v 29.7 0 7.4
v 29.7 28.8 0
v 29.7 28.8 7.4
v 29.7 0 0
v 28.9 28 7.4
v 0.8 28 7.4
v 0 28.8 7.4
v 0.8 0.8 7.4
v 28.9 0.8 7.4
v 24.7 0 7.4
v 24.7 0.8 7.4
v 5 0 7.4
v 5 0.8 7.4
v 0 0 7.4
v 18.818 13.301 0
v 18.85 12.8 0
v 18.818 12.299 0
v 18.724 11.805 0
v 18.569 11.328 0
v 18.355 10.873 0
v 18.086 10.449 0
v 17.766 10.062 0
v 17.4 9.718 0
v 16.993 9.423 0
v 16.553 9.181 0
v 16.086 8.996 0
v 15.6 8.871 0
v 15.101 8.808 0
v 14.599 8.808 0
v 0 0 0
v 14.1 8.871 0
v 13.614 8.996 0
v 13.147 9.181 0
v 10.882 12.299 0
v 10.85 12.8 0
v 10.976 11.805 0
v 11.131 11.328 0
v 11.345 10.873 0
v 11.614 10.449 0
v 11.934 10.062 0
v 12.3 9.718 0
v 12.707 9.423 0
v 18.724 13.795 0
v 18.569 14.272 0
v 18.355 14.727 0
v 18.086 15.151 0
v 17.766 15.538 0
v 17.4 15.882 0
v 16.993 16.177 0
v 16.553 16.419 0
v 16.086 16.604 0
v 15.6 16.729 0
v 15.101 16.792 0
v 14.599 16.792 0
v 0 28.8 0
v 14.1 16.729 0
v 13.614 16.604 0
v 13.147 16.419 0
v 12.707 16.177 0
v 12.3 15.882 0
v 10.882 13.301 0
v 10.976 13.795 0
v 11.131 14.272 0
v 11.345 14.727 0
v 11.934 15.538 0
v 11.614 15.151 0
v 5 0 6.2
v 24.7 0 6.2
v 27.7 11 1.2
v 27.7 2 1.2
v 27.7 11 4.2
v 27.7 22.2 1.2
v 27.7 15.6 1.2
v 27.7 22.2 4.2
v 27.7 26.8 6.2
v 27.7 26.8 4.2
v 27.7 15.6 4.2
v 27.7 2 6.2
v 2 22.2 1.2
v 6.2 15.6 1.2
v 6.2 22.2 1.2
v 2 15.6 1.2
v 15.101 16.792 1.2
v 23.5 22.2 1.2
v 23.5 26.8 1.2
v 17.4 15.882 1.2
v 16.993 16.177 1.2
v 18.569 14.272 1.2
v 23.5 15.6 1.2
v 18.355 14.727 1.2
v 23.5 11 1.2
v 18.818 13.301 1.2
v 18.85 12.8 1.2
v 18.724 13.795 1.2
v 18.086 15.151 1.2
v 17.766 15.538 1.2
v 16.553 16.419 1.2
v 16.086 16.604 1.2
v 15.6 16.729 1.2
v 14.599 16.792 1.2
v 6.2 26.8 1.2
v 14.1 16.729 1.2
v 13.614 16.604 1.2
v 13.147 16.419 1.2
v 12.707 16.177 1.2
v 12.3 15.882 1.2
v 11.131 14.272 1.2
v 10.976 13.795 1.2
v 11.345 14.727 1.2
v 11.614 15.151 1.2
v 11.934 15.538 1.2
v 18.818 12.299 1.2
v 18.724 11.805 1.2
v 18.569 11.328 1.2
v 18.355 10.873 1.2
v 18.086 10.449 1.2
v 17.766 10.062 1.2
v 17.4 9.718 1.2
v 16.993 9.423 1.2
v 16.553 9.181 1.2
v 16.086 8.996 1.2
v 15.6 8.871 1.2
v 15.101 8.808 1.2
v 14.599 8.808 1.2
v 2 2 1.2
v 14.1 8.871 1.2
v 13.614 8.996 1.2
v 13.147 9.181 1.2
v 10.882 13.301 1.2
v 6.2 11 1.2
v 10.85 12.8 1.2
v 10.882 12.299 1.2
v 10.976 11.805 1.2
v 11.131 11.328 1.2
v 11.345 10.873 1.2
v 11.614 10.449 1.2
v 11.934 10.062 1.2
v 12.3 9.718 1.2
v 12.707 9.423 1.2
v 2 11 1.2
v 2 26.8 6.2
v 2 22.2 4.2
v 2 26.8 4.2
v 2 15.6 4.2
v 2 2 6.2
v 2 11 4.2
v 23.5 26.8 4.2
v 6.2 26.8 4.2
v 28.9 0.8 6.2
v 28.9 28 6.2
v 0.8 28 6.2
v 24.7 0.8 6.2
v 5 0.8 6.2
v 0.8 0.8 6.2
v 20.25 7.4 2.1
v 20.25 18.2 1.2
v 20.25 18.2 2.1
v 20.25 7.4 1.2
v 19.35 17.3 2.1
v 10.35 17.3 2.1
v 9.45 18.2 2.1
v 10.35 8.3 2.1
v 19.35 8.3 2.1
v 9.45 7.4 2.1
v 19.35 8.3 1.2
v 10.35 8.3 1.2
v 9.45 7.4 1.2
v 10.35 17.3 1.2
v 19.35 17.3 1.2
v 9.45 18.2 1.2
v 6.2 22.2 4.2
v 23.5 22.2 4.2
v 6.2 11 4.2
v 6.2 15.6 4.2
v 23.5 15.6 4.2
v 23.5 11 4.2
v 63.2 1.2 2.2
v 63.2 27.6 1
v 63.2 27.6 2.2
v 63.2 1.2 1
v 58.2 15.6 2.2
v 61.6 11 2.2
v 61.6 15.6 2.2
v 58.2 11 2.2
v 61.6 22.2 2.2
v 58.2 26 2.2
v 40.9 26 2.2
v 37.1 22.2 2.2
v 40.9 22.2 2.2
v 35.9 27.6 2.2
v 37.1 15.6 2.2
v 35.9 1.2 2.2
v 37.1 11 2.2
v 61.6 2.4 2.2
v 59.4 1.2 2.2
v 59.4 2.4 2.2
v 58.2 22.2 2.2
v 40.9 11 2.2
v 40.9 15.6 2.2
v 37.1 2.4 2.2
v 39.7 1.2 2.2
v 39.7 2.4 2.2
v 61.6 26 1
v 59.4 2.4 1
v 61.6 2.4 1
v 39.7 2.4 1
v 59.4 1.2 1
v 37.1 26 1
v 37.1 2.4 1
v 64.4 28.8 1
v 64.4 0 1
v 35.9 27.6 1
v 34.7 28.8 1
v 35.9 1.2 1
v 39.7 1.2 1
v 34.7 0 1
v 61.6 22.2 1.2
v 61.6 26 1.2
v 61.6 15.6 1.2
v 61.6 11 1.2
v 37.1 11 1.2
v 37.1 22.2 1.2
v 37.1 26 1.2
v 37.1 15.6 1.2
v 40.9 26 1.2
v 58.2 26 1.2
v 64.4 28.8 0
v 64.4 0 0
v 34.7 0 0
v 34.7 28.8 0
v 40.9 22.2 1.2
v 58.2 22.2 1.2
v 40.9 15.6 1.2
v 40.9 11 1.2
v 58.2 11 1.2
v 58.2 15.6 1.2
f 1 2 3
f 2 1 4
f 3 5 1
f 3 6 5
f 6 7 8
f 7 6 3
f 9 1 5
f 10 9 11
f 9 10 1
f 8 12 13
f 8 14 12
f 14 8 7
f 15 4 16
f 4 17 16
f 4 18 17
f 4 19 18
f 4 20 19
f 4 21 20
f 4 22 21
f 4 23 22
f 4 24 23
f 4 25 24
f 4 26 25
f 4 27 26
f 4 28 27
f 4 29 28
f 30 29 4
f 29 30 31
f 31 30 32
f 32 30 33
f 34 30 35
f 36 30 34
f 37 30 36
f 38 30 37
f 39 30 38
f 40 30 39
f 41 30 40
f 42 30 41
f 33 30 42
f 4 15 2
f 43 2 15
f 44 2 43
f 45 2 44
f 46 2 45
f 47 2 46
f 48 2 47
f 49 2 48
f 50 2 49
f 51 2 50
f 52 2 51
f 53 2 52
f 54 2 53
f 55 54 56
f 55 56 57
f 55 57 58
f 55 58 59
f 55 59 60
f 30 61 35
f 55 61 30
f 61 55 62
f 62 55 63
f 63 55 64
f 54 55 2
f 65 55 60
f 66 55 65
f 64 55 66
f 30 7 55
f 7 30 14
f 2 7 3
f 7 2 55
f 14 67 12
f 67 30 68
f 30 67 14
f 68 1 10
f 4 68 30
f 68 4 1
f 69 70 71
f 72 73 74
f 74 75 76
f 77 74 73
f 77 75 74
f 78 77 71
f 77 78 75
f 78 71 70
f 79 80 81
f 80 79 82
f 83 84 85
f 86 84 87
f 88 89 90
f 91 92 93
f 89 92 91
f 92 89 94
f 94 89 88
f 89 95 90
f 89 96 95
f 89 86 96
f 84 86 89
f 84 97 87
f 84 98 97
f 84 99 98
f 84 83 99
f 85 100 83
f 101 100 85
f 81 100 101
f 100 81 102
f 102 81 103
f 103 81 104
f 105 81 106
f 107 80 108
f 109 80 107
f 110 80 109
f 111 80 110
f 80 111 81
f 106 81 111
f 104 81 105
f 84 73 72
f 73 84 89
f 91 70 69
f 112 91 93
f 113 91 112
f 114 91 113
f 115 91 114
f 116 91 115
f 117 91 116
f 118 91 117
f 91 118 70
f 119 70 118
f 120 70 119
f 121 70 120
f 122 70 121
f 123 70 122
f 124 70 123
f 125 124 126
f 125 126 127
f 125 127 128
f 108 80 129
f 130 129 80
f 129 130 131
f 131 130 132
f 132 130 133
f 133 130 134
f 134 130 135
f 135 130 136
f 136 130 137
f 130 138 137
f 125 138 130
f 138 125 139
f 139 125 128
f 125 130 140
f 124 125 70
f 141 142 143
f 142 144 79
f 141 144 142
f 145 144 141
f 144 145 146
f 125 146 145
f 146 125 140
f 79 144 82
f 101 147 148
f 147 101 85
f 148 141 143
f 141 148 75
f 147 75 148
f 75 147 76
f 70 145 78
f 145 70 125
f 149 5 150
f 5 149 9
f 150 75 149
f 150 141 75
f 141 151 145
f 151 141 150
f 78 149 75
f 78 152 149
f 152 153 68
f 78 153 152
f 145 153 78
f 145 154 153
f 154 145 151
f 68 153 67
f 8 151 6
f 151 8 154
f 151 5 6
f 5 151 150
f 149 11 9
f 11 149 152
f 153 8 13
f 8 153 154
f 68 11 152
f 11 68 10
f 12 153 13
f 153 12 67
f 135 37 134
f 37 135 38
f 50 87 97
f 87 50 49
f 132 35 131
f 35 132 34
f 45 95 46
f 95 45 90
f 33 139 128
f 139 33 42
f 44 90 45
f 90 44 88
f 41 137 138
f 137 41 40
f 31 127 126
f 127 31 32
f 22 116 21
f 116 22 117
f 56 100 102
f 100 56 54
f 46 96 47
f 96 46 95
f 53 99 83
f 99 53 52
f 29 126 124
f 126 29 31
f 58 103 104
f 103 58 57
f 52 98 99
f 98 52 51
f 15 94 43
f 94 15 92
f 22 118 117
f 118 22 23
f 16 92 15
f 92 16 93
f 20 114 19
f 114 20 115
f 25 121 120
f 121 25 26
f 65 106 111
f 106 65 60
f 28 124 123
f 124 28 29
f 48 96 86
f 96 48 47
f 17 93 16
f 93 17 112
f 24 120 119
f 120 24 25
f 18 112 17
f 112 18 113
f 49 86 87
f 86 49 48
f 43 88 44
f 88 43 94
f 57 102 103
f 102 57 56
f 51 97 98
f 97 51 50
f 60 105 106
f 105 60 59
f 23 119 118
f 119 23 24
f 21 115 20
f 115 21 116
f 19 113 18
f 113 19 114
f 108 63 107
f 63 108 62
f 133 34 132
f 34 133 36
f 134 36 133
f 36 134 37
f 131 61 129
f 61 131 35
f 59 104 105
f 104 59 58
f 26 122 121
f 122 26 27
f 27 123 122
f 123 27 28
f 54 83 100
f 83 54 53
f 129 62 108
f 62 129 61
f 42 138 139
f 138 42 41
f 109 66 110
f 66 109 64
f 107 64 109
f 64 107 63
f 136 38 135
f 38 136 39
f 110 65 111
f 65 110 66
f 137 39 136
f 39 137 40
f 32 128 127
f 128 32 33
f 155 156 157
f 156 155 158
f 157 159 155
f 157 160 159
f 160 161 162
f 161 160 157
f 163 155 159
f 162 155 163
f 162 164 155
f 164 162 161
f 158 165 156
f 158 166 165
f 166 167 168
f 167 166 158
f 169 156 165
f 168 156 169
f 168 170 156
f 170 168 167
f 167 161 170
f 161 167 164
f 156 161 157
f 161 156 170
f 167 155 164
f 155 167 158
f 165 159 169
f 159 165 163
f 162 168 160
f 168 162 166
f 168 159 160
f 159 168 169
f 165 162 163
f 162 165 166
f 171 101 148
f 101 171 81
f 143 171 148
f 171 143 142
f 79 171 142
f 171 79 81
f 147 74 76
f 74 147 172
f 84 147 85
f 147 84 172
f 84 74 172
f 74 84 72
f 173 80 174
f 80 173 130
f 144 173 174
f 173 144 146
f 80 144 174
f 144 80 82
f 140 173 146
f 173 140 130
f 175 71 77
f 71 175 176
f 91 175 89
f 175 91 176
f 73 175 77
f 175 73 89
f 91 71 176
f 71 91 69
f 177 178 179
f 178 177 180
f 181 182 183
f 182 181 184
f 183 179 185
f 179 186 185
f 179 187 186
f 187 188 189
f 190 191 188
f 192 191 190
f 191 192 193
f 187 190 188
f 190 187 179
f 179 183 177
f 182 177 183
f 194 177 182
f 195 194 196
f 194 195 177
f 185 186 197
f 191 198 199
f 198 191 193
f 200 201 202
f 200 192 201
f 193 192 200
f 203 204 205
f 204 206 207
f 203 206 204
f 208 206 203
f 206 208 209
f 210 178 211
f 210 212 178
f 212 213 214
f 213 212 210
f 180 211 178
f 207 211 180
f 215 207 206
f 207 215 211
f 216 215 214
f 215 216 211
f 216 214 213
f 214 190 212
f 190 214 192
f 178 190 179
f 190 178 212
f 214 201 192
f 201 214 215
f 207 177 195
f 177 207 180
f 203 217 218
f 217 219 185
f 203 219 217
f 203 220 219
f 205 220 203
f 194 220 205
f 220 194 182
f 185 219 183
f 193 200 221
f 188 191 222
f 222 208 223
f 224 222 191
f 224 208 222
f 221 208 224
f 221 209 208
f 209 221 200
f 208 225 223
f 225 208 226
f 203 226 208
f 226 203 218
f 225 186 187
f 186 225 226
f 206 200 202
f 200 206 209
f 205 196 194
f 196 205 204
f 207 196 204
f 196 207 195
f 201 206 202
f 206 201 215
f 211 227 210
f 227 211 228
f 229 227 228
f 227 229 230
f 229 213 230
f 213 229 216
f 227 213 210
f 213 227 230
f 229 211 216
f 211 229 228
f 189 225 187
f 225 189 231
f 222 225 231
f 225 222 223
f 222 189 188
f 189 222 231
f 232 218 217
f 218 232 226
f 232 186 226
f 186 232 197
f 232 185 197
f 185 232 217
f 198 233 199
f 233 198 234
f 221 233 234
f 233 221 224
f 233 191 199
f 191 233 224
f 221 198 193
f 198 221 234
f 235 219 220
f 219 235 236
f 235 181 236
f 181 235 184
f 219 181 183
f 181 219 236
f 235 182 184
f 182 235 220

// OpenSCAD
///////////////
// Variables //
///////////////

clearance = 0.4;

// wall width
wall_width = 2;

// Camera module x
module_x = 24.9;

// Camera module y
module_y = 24;

// Camera module y
module_z = 7.8;

// Inner depth
shell_width = 1.2;

// Lip thickness
lip_width = 1.2;

// Lip height
lip_height = 1.2;

// Ribbon cable slot offset
ribbon_offset_x = 5;

// Ribbon cable slot height
ribbon_z = 1.2;

// Hole diameter for the lens
lens_diameter = 8;

// Move lens hole a little bit off the middle
lens_y_offset = 1.6;

// Borders for the lense module
lens_cube = 9;

// Border thickness for the lens module
lens_cube_wall = 0.9;

// Module spacer x
module_stand_x = 4.2;

// Module spacer y
module_stand_y = 4.6;

// Module spacer z
module_stand_z = 3;

// Move two spacers to the middle
module_stand_offset = 9;

// Lid thickness
lid_height = 1;


///////////////////////
// Calculated values //
///////////////////////

case_top_x = module_x+2*wall_width+2*clearance;
case_top_y = module_y+2*wall_width+2*clearance;
case_top_z = module_z - clearance;

////////////////
// Draw parts //
////////////////

case_top();
translate([case_top_x+5, 0, 0]) {
    lid();
}

/////////////
// Modules //
/////////////

module case_top() {
    
    difference() {
        
        // Outer cube
        cube ([case_top_x, case_top_y, case_top_z]);
        
        // Inner cube
        inner_cube_x = case_top_x - 2*wall_width;
        inner_cube_y = case_top_y - 2*wall_width;
        inner_cube_z = case_top_z-shell_width+clearance;
        
        translate([wall_width, wall_width, shell_width]) {
            cube ([inner_cube_x, inner_cube_y, inner_cube_z]);
        }

        // Lip cube
        lip_cube_x = case_top_x - 2*(wall_width-lip_width);
        lip_cube_y = case_top_y - 2*(wall_width-lip_width);
        lip_cube_z = case_top_z-shell_width+clearance;

        translate([wall_width-lip_width, wall_width-lip_width, case_top_z-lip_height]) {
            cube ([lip_cube_x, lip_cube_y, lip_cube_z]);
        }

        // Ribbon cut
        ribbon_cube_x = case_top_x - 2*ribbon_offset_x;
        ribbon_cube_y = wall_width+2*clearance;
        ribbon_cube_z = ribbon_z+clearance;

        translate([ribbon_offset_x, -clearance, case_top_z - ribbon_z]) {
            cube ([ribbon_cube_x, ribbon_cube_y, ribbon_cube_z]);
        }
        
        // Lens
        translate([case_top_x/2, case_top_y/2-lens_y_offset, -clearance]) {
            cylinder (d=lens_diameter, h=shell_width+2*clearance, $fn=50);
        }
    }

    // Module stand
    translate([wall_width, case_top_y-wall_width-module_stand_y, shell_width]) {
        cube ([module_stand_x, module_stand_y, module_stand_z]);
    }
    translate([case_top_x-wall_width-module_stand_x, case_top_y-wall_width-module_stand_y, shell_width]) {
        cube ([module_stand_x, module_stand_y, module_stand_z]);
    }
    translate([wall_width, wall_width+module_stand_offset, shell_width]) {
        cube ([module_stand_x, module_stand_y, module_stand_z]);
    }
    translate([case_top_x-wall_width-module_stand_x, wall_width+module_stand_offset, shell_width]) {
        cube ([module_stand_x, module_stand_y, module_stand_z]);
    }

    // Lense cube
    translate_x = case_top_x/2 - lens_cube/2 - lens_cube_wall;
    translate_y = case_top_y/2 - lens_cube/2 - lens_cube_wall - lens_y_offset;

    translate([translate_x, translate_y, shell_width]) {
        difference() {
            cube ([lens_cube+2*lens_cube_wall, lens_cube+2*lens_cube_wall, lens_cube_wall]);
            translate([lens_cube_wall,lens_cube_wall,0]) {
                cube ([lens_cube, lens_cube, lens_cube_wall+clearance]);
            }
            translate([lens_cube/2+lens_cube_wall, lens_cube/2+lens_cube_wall, -clearance]) {
            cylinder (d=lens_diameter, h=shell_width+2*clearance, $fn=50);
        }

        }
    }
}

module lid() {
    
    cube([case_top_x, case_top_y, lid_height]);

    translate([
        wall_width-lip_width+clearance,
        wall_width-lip_width+clearance,
        lid_height]) {

        outer_lip_cube_x = case_top_x-2*wall_width+lip_width+clearance;
        outer_lip_cube_y = case_top_y-2*wall_width+lip_width+clearance;
        outer_lip_cube_z = lip_height;

        inner_lip_cube_x = case_top_x-2*wall_width-lip_width;
        inner_lip_cube_y = case_top_y-2*wall_width-lip_width;
        inner_lip_cube_z = lip_height + 2*clearance;

        difference() {
            
            // Lip cubes
            cube([outer_lip_cube_x, outer_lip_cube_y, outer_lip_cube_z]);
            translate([lip_width, lip_width, -clearance]) {
                cube([inner_lip_cube_x, inner_lip_cube_y, inner_lip_cube_z]);
            }
            
            // Ribbon cut
            ribbon_cube_x = case_top_x - 2*ribbon_offset_x;
            ribbon_cube_y = wall_width+2*clearance;
            ribbon_cube_z = ribbon_z+clearance;

            translate([ribbon_offset_x-(wall_width-lip_width+clearance), -clearance, 0]) {
                cube ([ribbon_cube_x, ribbon_cube_y, ribbon_cube_z]);
            }
        }
    }
    // Module stand
    translate([wall_width, case_top_y-wall_width-module_stand_y, shell_width]) {
        cube ([module_stand_x, module_stand_y, lid_height]);
    }
    translate([case_top_x-wall_width-module_stand_x, case_top_y-wall_width-module_stand_y, shell_width]) {
        cube ([module_stand_x, module_stand_y, lid_height]);
    }
    translate([wall_width, wall_width+module_stand_offset, shell_width]) {
        cube ([module_stand_x, module_stand_y, lid_height]);
    }
    translate([case_top_x-wall_width-module_stand_x, wall_width+module_stand_offset, shell_width]) {
        cube ([module_stand_x, module_stand_y, lid_height]);
    }
}
